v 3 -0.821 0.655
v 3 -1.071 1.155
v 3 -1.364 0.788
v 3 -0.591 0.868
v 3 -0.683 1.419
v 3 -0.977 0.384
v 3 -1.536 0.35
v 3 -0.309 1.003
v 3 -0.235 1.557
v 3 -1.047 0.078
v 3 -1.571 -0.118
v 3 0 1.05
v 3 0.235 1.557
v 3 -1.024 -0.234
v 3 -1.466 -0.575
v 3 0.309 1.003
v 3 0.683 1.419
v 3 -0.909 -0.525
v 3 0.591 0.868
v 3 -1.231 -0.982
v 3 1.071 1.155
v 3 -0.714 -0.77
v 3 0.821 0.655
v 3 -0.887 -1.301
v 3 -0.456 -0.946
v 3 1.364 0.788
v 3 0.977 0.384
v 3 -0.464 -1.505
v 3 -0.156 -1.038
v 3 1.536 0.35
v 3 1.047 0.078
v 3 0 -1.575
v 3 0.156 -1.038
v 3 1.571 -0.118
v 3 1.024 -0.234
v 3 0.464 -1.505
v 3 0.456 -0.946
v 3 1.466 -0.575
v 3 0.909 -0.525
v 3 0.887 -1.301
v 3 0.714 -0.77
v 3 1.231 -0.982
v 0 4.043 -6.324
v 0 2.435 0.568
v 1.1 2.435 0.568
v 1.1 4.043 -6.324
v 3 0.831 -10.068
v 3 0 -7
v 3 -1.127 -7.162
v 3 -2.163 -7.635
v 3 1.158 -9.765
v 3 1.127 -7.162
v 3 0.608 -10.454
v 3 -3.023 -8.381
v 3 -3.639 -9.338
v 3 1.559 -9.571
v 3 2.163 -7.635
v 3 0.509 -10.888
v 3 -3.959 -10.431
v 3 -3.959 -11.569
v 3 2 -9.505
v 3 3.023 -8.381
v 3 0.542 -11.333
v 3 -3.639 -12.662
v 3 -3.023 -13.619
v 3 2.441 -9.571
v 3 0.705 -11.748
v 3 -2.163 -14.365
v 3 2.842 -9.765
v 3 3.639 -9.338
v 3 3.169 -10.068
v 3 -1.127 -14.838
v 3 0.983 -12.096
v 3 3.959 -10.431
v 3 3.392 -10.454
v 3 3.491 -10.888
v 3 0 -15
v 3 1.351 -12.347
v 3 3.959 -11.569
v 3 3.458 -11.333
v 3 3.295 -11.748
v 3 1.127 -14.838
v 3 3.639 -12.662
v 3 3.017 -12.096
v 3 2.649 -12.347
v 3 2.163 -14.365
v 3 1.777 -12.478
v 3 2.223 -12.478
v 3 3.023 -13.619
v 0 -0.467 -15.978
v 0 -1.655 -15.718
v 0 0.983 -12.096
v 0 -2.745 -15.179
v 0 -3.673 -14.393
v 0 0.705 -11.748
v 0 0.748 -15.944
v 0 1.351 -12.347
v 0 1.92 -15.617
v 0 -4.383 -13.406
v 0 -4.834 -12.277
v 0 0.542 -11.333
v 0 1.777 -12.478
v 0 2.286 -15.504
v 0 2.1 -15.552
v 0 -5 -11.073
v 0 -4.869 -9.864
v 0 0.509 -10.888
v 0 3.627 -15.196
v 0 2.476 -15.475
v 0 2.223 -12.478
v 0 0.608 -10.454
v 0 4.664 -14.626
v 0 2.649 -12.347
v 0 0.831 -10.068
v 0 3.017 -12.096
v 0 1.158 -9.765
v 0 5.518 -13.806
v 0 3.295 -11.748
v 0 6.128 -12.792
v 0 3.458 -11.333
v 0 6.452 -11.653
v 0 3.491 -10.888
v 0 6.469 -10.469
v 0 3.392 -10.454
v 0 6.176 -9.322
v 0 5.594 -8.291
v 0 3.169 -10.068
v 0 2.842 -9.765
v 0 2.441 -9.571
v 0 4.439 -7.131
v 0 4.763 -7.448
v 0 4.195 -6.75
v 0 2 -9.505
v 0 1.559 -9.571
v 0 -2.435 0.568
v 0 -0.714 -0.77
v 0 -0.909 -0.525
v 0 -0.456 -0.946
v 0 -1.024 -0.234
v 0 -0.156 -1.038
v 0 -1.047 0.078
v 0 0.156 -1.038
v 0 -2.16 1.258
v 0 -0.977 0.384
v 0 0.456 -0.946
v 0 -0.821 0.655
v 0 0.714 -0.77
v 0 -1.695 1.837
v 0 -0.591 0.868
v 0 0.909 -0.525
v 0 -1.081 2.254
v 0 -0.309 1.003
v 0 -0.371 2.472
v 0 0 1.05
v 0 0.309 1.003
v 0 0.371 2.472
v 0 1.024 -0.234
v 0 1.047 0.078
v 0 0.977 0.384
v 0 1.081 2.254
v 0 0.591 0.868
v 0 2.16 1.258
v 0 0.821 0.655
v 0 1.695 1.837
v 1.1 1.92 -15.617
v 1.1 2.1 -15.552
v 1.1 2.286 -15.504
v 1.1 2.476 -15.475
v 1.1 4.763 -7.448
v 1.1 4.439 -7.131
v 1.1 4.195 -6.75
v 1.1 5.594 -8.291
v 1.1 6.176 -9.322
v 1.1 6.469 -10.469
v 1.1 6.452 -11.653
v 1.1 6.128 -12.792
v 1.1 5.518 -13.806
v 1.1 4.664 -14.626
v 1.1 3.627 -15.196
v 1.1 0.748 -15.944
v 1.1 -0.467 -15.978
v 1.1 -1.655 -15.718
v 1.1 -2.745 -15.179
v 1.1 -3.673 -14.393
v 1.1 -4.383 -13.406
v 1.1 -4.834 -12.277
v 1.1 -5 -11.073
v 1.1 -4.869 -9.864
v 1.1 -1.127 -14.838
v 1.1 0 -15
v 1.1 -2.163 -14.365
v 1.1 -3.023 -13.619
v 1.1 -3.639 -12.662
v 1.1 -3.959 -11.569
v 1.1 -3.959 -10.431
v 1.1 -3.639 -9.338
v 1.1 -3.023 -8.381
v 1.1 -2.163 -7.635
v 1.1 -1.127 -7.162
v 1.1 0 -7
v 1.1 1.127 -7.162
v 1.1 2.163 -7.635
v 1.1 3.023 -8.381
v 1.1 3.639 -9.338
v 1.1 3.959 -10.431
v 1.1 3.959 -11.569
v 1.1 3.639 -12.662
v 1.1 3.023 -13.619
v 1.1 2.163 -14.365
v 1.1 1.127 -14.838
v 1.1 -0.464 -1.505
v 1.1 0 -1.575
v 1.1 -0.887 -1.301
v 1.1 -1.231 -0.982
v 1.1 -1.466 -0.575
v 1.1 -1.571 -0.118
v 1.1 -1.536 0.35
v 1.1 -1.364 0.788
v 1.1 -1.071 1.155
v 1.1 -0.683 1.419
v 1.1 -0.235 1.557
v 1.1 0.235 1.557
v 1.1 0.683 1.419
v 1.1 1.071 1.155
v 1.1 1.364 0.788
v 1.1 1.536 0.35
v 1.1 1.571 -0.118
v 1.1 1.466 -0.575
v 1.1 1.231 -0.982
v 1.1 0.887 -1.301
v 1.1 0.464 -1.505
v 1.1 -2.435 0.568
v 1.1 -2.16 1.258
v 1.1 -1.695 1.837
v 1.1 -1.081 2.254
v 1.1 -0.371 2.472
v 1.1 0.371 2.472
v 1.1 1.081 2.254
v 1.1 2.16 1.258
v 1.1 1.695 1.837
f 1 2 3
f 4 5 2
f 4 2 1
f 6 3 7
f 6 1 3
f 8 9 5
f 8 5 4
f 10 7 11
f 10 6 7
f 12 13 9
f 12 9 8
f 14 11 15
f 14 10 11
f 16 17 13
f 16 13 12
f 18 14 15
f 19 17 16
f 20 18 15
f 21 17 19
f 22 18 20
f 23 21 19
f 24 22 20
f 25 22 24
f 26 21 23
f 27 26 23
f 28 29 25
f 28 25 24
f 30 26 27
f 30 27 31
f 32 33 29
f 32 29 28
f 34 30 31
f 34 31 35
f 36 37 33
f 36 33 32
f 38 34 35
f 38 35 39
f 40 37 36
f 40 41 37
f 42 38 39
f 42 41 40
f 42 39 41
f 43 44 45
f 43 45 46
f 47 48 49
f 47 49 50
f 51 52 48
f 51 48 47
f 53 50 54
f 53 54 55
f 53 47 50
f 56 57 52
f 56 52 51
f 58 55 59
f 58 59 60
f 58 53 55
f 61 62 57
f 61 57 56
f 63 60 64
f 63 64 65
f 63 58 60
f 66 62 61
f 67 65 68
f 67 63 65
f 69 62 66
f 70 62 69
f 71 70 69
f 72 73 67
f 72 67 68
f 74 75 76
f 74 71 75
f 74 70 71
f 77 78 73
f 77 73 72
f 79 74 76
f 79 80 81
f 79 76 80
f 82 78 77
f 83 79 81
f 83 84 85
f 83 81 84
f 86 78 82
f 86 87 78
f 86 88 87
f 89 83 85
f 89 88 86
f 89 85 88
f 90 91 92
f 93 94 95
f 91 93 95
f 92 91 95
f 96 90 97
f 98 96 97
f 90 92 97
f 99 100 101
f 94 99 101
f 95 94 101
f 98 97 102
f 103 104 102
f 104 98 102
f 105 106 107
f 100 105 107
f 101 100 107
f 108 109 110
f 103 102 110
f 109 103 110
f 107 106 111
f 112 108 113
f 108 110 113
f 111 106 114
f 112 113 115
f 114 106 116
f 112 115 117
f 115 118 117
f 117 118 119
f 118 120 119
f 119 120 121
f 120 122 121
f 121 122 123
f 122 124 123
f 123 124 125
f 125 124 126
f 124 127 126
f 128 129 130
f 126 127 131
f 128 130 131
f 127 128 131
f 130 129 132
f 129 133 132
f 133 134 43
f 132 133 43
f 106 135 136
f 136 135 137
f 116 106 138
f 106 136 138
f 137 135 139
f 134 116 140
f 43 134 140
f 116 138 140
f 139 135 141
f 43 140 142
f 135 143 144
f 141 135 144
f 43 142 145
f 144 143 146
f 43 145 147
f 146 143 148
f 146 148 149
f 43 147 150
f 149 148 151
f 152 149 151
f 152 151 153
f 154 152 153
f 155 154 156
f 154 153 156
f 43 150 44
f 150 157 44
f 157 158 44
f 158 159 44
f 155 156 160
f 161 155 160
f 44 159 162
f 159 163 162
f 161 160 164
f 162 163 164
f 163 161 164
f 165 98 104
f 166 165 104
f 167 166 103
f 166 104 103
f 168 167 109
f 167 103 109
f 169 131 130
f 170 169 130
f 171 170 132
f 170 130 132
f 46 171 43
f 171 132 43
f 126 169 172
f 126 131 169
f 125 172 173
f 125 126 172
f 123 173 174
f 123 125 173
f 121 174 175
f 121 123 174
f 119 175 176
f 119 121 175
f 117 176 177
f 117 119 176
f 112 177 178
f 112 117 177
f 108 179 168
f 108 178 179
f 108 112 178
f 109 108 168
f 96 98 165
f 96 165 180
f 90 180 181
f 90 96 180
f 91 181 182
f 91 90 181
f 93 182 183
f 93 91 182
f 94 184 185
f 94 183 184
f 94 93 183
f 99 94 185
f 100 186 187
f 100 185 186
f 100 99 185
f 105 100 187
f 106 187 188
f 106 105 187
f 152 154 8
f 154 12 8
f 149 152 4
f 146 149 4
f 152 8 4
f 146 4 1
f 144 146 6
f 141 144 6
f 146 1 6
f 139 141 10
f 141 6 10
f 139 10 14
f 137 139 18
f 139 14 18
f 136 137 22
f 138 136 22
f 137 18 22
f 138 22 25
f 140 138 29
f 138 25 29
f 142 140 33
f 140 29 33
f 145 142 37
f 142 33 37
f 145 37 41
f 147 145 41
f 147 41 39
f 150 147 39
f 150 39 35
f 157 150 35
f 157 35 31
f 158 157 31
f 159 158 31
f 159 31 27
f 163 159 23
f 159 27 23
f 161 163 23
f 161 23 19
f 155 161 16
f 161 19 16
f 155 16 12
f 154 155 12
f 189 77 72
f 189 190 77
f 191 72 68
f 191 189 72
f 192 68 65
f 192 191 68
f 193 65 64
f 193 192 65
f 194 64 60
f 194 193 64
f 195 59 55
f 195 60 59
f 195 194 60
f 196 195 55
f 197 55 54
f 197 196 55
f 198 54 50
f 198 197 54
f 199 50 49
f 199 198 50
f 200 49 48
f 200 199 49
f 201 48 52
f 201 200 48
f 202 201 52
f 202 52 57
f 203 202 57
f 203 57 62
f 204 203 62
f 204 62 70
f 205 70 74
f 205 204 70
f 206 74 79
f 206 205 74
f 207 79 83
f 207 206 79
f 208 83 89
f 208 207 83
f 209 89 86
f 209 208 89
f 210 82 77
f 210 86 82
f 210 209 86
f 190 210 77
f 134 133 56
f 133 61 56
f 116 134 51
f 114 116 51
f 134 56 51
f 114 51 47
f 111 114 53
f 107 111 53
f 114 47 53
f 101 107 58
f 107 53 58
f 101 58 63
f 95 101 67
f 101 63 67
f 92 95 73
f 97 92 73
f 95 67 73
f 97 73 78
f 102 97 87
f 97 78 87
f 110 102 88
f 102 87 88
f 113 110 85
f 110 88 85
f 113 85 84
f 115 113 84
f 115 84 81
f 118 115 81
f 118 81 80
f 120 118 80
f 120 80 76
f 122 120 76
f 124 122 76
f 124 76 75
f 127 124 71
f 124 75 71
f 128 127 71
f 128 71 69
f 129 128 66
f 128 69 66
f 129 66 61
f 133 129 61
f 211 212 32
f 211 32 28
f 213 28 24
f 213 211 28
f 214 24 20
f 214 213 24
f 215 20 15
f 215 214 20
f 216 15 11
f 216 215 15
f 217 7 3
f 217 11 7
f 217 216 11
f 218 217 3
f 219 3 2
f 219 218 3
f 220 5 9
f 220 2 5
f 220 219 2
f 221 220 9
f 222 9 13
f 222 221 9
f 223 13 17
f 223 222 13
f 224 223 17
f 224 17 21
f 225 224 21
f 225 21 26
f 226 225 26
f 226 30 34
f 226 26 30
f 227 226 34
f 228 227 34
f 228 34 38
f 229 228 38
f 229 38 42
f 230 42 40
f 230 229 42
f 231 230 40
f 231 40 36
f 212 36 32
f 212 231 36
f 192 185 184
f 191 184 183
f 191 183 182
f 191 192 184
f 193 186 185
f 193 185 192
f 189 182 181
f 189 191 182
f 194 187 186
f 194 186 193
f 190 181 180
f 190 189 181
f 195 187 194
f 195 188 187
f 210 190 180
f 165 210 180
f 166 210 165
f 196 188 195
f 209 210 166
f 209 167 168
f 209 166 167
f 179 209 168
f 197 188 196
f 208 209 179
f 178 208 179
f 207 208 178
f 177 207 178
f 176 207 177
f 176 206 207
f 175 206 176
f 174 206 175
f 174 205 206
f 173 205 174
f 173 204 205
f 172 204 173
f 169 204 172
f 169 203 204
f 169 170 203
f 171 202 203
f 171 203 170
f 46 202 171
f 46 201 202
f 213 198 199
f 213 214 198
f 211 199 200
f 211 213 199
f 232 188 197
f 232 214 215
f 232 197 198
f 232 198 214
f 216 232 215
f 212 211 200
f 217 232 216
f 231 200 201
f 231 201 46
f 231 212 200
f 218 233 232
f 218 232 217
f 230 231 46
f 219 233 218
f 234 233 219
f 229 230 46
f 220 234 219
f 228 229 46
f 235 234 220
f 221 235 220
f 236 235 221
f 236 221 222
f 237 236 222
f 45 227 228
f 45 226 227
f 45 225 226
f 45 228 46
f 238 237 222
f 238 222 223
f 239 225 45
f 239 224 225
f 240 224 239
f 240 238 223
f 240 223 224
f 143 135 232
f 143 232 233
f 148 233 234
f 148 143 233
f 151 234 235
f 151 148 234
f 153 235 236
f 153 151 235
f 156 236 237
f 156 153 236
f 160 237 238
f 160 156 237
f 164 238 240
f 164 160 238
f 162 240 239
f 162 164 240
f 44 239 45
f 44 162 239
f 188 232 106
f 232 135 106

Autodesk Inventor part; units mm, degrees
ref_plane "YZ Plane" through (0, 0, 0) normal (1, 0, 0) x (0, 1, 0)
ref_plane "XZ Plane" through (0, 0, 0) normal (0, 1, 0) x (-1, 0, 0)
ref_plane "XY Plane" through (0, 0, 0) normal (0, 0, 1) x (1, 0, 0)
sketch "スケッチ1" plane through (0, 0, 0) normal (1, 0, 0) x (0, 1, 0)
  line L0 (0, 0) -> (0, -11) construction
  arc A0 (2.4346, 0.5682) -> (-2.4346, 0.5682) centre (0, 0) ccw
  circle A1 centre (0, -11) radius 4 construction
  line L1 (-2.4346, 0.5682) -> (-4.8692, -9.8636)
  arc A2 (0, -2.5) -> (2.4346, 0.5682) centre (0, 0) ccw construction
  arc A3 (-2.4346, 0.5682) -> (0, -2.5) centre (0, 0) ccw construction
  arc A4 (-4.8692, -9.8636) -> (1.9196, -15.6168) centre (0, -11) ccw
  arc A5 (-0.8211, -15.9321) -> (2.1875, -15.4961) centre (0, -11) ccw construction
  line L2 (2.4346, 0.5682) -> (4.043, -6.3238)
  arc A6 (2.476, -15.4748) -> (4.7628, -7.448) centre (2, -11) ccw
  line L3 (0, -11) -> (2, -11) construction
  arc A7 (0, -6) -> (-4.8692, -9.8636) centre (0, -11) ccw construction
  arc A8 (4.043, -6.3238) -> (4.7628, -7.448) centre (5.9907, -5.8693) ccw
  arc A9 (2.476, -15.4748) -> (1.9196, -15.6168) centre (2.6875, -17.4635) ccw
  point P0 (4.221, -7.0863)
  dimension "d1" = 11
  dimension "d2" = 8
  dimension "d4" = 2.5
  dimension "d39" = 5
  dimension "d54" = 2
  dimension "d55" = 4.5
  dimension "d56" = 2
extrude "押し出し1" add sketch "スケッチ1" along normal blind 1.1
sketch "スケッチ2" plane through (1.1, 0, 0) normal (1, 0, 0) x (0, 0, -1)
  circle A0 centre (0, 0) radius 1.575
  circle A1 centre (11, 0) radius 4
  line L0 (0, 0) -> (11, 0) construction
  arc A2 (9.8636, -4.8692) -> (15.6168, 1.9196) centre (11, 0) ccw construction
  point P0 (8.75, 4.8412)
  dimension "d12" = 3.15
  dimension "d13" = 8
extrude "押し出し2" add sketch "スケッチ2" along normal blind 1.9
sketch "スケッチ3" plane through (1.1, 0, 0) normal (1, 0, 0) x (0, 0, -1)
  point P0 (0, 0)
sketch "スケッチ4" plane through (0, 0, 0) normal (-1, 0, 0) x (0, 0, 1)
  arc A0 (0.5682, -2.4346) -> (0.5682, 2.4346) centre (0, 0) ccw construction
  arc A1 (-15.6168, 1.9196) -> (-9.8636, -4.8692) centre (-11, 0) ccw construction
  line L0 (-11, 0) -> (-11, 2) construction
  dimension "d53" = 2
hole "穴3" at (0, 0, 0) direction (1, 0, 0) diameter 2.1 end through all clearance for "Countersunk Flat Head Screw ISO 2009/7046" size "M2" standard "ISO"
hole "穴4" at (0, 2, -11) direction (1, 0, 0) diameter 2.99 end through all
properties part number "UPPER_LEG_BELT_TENSIONER"
